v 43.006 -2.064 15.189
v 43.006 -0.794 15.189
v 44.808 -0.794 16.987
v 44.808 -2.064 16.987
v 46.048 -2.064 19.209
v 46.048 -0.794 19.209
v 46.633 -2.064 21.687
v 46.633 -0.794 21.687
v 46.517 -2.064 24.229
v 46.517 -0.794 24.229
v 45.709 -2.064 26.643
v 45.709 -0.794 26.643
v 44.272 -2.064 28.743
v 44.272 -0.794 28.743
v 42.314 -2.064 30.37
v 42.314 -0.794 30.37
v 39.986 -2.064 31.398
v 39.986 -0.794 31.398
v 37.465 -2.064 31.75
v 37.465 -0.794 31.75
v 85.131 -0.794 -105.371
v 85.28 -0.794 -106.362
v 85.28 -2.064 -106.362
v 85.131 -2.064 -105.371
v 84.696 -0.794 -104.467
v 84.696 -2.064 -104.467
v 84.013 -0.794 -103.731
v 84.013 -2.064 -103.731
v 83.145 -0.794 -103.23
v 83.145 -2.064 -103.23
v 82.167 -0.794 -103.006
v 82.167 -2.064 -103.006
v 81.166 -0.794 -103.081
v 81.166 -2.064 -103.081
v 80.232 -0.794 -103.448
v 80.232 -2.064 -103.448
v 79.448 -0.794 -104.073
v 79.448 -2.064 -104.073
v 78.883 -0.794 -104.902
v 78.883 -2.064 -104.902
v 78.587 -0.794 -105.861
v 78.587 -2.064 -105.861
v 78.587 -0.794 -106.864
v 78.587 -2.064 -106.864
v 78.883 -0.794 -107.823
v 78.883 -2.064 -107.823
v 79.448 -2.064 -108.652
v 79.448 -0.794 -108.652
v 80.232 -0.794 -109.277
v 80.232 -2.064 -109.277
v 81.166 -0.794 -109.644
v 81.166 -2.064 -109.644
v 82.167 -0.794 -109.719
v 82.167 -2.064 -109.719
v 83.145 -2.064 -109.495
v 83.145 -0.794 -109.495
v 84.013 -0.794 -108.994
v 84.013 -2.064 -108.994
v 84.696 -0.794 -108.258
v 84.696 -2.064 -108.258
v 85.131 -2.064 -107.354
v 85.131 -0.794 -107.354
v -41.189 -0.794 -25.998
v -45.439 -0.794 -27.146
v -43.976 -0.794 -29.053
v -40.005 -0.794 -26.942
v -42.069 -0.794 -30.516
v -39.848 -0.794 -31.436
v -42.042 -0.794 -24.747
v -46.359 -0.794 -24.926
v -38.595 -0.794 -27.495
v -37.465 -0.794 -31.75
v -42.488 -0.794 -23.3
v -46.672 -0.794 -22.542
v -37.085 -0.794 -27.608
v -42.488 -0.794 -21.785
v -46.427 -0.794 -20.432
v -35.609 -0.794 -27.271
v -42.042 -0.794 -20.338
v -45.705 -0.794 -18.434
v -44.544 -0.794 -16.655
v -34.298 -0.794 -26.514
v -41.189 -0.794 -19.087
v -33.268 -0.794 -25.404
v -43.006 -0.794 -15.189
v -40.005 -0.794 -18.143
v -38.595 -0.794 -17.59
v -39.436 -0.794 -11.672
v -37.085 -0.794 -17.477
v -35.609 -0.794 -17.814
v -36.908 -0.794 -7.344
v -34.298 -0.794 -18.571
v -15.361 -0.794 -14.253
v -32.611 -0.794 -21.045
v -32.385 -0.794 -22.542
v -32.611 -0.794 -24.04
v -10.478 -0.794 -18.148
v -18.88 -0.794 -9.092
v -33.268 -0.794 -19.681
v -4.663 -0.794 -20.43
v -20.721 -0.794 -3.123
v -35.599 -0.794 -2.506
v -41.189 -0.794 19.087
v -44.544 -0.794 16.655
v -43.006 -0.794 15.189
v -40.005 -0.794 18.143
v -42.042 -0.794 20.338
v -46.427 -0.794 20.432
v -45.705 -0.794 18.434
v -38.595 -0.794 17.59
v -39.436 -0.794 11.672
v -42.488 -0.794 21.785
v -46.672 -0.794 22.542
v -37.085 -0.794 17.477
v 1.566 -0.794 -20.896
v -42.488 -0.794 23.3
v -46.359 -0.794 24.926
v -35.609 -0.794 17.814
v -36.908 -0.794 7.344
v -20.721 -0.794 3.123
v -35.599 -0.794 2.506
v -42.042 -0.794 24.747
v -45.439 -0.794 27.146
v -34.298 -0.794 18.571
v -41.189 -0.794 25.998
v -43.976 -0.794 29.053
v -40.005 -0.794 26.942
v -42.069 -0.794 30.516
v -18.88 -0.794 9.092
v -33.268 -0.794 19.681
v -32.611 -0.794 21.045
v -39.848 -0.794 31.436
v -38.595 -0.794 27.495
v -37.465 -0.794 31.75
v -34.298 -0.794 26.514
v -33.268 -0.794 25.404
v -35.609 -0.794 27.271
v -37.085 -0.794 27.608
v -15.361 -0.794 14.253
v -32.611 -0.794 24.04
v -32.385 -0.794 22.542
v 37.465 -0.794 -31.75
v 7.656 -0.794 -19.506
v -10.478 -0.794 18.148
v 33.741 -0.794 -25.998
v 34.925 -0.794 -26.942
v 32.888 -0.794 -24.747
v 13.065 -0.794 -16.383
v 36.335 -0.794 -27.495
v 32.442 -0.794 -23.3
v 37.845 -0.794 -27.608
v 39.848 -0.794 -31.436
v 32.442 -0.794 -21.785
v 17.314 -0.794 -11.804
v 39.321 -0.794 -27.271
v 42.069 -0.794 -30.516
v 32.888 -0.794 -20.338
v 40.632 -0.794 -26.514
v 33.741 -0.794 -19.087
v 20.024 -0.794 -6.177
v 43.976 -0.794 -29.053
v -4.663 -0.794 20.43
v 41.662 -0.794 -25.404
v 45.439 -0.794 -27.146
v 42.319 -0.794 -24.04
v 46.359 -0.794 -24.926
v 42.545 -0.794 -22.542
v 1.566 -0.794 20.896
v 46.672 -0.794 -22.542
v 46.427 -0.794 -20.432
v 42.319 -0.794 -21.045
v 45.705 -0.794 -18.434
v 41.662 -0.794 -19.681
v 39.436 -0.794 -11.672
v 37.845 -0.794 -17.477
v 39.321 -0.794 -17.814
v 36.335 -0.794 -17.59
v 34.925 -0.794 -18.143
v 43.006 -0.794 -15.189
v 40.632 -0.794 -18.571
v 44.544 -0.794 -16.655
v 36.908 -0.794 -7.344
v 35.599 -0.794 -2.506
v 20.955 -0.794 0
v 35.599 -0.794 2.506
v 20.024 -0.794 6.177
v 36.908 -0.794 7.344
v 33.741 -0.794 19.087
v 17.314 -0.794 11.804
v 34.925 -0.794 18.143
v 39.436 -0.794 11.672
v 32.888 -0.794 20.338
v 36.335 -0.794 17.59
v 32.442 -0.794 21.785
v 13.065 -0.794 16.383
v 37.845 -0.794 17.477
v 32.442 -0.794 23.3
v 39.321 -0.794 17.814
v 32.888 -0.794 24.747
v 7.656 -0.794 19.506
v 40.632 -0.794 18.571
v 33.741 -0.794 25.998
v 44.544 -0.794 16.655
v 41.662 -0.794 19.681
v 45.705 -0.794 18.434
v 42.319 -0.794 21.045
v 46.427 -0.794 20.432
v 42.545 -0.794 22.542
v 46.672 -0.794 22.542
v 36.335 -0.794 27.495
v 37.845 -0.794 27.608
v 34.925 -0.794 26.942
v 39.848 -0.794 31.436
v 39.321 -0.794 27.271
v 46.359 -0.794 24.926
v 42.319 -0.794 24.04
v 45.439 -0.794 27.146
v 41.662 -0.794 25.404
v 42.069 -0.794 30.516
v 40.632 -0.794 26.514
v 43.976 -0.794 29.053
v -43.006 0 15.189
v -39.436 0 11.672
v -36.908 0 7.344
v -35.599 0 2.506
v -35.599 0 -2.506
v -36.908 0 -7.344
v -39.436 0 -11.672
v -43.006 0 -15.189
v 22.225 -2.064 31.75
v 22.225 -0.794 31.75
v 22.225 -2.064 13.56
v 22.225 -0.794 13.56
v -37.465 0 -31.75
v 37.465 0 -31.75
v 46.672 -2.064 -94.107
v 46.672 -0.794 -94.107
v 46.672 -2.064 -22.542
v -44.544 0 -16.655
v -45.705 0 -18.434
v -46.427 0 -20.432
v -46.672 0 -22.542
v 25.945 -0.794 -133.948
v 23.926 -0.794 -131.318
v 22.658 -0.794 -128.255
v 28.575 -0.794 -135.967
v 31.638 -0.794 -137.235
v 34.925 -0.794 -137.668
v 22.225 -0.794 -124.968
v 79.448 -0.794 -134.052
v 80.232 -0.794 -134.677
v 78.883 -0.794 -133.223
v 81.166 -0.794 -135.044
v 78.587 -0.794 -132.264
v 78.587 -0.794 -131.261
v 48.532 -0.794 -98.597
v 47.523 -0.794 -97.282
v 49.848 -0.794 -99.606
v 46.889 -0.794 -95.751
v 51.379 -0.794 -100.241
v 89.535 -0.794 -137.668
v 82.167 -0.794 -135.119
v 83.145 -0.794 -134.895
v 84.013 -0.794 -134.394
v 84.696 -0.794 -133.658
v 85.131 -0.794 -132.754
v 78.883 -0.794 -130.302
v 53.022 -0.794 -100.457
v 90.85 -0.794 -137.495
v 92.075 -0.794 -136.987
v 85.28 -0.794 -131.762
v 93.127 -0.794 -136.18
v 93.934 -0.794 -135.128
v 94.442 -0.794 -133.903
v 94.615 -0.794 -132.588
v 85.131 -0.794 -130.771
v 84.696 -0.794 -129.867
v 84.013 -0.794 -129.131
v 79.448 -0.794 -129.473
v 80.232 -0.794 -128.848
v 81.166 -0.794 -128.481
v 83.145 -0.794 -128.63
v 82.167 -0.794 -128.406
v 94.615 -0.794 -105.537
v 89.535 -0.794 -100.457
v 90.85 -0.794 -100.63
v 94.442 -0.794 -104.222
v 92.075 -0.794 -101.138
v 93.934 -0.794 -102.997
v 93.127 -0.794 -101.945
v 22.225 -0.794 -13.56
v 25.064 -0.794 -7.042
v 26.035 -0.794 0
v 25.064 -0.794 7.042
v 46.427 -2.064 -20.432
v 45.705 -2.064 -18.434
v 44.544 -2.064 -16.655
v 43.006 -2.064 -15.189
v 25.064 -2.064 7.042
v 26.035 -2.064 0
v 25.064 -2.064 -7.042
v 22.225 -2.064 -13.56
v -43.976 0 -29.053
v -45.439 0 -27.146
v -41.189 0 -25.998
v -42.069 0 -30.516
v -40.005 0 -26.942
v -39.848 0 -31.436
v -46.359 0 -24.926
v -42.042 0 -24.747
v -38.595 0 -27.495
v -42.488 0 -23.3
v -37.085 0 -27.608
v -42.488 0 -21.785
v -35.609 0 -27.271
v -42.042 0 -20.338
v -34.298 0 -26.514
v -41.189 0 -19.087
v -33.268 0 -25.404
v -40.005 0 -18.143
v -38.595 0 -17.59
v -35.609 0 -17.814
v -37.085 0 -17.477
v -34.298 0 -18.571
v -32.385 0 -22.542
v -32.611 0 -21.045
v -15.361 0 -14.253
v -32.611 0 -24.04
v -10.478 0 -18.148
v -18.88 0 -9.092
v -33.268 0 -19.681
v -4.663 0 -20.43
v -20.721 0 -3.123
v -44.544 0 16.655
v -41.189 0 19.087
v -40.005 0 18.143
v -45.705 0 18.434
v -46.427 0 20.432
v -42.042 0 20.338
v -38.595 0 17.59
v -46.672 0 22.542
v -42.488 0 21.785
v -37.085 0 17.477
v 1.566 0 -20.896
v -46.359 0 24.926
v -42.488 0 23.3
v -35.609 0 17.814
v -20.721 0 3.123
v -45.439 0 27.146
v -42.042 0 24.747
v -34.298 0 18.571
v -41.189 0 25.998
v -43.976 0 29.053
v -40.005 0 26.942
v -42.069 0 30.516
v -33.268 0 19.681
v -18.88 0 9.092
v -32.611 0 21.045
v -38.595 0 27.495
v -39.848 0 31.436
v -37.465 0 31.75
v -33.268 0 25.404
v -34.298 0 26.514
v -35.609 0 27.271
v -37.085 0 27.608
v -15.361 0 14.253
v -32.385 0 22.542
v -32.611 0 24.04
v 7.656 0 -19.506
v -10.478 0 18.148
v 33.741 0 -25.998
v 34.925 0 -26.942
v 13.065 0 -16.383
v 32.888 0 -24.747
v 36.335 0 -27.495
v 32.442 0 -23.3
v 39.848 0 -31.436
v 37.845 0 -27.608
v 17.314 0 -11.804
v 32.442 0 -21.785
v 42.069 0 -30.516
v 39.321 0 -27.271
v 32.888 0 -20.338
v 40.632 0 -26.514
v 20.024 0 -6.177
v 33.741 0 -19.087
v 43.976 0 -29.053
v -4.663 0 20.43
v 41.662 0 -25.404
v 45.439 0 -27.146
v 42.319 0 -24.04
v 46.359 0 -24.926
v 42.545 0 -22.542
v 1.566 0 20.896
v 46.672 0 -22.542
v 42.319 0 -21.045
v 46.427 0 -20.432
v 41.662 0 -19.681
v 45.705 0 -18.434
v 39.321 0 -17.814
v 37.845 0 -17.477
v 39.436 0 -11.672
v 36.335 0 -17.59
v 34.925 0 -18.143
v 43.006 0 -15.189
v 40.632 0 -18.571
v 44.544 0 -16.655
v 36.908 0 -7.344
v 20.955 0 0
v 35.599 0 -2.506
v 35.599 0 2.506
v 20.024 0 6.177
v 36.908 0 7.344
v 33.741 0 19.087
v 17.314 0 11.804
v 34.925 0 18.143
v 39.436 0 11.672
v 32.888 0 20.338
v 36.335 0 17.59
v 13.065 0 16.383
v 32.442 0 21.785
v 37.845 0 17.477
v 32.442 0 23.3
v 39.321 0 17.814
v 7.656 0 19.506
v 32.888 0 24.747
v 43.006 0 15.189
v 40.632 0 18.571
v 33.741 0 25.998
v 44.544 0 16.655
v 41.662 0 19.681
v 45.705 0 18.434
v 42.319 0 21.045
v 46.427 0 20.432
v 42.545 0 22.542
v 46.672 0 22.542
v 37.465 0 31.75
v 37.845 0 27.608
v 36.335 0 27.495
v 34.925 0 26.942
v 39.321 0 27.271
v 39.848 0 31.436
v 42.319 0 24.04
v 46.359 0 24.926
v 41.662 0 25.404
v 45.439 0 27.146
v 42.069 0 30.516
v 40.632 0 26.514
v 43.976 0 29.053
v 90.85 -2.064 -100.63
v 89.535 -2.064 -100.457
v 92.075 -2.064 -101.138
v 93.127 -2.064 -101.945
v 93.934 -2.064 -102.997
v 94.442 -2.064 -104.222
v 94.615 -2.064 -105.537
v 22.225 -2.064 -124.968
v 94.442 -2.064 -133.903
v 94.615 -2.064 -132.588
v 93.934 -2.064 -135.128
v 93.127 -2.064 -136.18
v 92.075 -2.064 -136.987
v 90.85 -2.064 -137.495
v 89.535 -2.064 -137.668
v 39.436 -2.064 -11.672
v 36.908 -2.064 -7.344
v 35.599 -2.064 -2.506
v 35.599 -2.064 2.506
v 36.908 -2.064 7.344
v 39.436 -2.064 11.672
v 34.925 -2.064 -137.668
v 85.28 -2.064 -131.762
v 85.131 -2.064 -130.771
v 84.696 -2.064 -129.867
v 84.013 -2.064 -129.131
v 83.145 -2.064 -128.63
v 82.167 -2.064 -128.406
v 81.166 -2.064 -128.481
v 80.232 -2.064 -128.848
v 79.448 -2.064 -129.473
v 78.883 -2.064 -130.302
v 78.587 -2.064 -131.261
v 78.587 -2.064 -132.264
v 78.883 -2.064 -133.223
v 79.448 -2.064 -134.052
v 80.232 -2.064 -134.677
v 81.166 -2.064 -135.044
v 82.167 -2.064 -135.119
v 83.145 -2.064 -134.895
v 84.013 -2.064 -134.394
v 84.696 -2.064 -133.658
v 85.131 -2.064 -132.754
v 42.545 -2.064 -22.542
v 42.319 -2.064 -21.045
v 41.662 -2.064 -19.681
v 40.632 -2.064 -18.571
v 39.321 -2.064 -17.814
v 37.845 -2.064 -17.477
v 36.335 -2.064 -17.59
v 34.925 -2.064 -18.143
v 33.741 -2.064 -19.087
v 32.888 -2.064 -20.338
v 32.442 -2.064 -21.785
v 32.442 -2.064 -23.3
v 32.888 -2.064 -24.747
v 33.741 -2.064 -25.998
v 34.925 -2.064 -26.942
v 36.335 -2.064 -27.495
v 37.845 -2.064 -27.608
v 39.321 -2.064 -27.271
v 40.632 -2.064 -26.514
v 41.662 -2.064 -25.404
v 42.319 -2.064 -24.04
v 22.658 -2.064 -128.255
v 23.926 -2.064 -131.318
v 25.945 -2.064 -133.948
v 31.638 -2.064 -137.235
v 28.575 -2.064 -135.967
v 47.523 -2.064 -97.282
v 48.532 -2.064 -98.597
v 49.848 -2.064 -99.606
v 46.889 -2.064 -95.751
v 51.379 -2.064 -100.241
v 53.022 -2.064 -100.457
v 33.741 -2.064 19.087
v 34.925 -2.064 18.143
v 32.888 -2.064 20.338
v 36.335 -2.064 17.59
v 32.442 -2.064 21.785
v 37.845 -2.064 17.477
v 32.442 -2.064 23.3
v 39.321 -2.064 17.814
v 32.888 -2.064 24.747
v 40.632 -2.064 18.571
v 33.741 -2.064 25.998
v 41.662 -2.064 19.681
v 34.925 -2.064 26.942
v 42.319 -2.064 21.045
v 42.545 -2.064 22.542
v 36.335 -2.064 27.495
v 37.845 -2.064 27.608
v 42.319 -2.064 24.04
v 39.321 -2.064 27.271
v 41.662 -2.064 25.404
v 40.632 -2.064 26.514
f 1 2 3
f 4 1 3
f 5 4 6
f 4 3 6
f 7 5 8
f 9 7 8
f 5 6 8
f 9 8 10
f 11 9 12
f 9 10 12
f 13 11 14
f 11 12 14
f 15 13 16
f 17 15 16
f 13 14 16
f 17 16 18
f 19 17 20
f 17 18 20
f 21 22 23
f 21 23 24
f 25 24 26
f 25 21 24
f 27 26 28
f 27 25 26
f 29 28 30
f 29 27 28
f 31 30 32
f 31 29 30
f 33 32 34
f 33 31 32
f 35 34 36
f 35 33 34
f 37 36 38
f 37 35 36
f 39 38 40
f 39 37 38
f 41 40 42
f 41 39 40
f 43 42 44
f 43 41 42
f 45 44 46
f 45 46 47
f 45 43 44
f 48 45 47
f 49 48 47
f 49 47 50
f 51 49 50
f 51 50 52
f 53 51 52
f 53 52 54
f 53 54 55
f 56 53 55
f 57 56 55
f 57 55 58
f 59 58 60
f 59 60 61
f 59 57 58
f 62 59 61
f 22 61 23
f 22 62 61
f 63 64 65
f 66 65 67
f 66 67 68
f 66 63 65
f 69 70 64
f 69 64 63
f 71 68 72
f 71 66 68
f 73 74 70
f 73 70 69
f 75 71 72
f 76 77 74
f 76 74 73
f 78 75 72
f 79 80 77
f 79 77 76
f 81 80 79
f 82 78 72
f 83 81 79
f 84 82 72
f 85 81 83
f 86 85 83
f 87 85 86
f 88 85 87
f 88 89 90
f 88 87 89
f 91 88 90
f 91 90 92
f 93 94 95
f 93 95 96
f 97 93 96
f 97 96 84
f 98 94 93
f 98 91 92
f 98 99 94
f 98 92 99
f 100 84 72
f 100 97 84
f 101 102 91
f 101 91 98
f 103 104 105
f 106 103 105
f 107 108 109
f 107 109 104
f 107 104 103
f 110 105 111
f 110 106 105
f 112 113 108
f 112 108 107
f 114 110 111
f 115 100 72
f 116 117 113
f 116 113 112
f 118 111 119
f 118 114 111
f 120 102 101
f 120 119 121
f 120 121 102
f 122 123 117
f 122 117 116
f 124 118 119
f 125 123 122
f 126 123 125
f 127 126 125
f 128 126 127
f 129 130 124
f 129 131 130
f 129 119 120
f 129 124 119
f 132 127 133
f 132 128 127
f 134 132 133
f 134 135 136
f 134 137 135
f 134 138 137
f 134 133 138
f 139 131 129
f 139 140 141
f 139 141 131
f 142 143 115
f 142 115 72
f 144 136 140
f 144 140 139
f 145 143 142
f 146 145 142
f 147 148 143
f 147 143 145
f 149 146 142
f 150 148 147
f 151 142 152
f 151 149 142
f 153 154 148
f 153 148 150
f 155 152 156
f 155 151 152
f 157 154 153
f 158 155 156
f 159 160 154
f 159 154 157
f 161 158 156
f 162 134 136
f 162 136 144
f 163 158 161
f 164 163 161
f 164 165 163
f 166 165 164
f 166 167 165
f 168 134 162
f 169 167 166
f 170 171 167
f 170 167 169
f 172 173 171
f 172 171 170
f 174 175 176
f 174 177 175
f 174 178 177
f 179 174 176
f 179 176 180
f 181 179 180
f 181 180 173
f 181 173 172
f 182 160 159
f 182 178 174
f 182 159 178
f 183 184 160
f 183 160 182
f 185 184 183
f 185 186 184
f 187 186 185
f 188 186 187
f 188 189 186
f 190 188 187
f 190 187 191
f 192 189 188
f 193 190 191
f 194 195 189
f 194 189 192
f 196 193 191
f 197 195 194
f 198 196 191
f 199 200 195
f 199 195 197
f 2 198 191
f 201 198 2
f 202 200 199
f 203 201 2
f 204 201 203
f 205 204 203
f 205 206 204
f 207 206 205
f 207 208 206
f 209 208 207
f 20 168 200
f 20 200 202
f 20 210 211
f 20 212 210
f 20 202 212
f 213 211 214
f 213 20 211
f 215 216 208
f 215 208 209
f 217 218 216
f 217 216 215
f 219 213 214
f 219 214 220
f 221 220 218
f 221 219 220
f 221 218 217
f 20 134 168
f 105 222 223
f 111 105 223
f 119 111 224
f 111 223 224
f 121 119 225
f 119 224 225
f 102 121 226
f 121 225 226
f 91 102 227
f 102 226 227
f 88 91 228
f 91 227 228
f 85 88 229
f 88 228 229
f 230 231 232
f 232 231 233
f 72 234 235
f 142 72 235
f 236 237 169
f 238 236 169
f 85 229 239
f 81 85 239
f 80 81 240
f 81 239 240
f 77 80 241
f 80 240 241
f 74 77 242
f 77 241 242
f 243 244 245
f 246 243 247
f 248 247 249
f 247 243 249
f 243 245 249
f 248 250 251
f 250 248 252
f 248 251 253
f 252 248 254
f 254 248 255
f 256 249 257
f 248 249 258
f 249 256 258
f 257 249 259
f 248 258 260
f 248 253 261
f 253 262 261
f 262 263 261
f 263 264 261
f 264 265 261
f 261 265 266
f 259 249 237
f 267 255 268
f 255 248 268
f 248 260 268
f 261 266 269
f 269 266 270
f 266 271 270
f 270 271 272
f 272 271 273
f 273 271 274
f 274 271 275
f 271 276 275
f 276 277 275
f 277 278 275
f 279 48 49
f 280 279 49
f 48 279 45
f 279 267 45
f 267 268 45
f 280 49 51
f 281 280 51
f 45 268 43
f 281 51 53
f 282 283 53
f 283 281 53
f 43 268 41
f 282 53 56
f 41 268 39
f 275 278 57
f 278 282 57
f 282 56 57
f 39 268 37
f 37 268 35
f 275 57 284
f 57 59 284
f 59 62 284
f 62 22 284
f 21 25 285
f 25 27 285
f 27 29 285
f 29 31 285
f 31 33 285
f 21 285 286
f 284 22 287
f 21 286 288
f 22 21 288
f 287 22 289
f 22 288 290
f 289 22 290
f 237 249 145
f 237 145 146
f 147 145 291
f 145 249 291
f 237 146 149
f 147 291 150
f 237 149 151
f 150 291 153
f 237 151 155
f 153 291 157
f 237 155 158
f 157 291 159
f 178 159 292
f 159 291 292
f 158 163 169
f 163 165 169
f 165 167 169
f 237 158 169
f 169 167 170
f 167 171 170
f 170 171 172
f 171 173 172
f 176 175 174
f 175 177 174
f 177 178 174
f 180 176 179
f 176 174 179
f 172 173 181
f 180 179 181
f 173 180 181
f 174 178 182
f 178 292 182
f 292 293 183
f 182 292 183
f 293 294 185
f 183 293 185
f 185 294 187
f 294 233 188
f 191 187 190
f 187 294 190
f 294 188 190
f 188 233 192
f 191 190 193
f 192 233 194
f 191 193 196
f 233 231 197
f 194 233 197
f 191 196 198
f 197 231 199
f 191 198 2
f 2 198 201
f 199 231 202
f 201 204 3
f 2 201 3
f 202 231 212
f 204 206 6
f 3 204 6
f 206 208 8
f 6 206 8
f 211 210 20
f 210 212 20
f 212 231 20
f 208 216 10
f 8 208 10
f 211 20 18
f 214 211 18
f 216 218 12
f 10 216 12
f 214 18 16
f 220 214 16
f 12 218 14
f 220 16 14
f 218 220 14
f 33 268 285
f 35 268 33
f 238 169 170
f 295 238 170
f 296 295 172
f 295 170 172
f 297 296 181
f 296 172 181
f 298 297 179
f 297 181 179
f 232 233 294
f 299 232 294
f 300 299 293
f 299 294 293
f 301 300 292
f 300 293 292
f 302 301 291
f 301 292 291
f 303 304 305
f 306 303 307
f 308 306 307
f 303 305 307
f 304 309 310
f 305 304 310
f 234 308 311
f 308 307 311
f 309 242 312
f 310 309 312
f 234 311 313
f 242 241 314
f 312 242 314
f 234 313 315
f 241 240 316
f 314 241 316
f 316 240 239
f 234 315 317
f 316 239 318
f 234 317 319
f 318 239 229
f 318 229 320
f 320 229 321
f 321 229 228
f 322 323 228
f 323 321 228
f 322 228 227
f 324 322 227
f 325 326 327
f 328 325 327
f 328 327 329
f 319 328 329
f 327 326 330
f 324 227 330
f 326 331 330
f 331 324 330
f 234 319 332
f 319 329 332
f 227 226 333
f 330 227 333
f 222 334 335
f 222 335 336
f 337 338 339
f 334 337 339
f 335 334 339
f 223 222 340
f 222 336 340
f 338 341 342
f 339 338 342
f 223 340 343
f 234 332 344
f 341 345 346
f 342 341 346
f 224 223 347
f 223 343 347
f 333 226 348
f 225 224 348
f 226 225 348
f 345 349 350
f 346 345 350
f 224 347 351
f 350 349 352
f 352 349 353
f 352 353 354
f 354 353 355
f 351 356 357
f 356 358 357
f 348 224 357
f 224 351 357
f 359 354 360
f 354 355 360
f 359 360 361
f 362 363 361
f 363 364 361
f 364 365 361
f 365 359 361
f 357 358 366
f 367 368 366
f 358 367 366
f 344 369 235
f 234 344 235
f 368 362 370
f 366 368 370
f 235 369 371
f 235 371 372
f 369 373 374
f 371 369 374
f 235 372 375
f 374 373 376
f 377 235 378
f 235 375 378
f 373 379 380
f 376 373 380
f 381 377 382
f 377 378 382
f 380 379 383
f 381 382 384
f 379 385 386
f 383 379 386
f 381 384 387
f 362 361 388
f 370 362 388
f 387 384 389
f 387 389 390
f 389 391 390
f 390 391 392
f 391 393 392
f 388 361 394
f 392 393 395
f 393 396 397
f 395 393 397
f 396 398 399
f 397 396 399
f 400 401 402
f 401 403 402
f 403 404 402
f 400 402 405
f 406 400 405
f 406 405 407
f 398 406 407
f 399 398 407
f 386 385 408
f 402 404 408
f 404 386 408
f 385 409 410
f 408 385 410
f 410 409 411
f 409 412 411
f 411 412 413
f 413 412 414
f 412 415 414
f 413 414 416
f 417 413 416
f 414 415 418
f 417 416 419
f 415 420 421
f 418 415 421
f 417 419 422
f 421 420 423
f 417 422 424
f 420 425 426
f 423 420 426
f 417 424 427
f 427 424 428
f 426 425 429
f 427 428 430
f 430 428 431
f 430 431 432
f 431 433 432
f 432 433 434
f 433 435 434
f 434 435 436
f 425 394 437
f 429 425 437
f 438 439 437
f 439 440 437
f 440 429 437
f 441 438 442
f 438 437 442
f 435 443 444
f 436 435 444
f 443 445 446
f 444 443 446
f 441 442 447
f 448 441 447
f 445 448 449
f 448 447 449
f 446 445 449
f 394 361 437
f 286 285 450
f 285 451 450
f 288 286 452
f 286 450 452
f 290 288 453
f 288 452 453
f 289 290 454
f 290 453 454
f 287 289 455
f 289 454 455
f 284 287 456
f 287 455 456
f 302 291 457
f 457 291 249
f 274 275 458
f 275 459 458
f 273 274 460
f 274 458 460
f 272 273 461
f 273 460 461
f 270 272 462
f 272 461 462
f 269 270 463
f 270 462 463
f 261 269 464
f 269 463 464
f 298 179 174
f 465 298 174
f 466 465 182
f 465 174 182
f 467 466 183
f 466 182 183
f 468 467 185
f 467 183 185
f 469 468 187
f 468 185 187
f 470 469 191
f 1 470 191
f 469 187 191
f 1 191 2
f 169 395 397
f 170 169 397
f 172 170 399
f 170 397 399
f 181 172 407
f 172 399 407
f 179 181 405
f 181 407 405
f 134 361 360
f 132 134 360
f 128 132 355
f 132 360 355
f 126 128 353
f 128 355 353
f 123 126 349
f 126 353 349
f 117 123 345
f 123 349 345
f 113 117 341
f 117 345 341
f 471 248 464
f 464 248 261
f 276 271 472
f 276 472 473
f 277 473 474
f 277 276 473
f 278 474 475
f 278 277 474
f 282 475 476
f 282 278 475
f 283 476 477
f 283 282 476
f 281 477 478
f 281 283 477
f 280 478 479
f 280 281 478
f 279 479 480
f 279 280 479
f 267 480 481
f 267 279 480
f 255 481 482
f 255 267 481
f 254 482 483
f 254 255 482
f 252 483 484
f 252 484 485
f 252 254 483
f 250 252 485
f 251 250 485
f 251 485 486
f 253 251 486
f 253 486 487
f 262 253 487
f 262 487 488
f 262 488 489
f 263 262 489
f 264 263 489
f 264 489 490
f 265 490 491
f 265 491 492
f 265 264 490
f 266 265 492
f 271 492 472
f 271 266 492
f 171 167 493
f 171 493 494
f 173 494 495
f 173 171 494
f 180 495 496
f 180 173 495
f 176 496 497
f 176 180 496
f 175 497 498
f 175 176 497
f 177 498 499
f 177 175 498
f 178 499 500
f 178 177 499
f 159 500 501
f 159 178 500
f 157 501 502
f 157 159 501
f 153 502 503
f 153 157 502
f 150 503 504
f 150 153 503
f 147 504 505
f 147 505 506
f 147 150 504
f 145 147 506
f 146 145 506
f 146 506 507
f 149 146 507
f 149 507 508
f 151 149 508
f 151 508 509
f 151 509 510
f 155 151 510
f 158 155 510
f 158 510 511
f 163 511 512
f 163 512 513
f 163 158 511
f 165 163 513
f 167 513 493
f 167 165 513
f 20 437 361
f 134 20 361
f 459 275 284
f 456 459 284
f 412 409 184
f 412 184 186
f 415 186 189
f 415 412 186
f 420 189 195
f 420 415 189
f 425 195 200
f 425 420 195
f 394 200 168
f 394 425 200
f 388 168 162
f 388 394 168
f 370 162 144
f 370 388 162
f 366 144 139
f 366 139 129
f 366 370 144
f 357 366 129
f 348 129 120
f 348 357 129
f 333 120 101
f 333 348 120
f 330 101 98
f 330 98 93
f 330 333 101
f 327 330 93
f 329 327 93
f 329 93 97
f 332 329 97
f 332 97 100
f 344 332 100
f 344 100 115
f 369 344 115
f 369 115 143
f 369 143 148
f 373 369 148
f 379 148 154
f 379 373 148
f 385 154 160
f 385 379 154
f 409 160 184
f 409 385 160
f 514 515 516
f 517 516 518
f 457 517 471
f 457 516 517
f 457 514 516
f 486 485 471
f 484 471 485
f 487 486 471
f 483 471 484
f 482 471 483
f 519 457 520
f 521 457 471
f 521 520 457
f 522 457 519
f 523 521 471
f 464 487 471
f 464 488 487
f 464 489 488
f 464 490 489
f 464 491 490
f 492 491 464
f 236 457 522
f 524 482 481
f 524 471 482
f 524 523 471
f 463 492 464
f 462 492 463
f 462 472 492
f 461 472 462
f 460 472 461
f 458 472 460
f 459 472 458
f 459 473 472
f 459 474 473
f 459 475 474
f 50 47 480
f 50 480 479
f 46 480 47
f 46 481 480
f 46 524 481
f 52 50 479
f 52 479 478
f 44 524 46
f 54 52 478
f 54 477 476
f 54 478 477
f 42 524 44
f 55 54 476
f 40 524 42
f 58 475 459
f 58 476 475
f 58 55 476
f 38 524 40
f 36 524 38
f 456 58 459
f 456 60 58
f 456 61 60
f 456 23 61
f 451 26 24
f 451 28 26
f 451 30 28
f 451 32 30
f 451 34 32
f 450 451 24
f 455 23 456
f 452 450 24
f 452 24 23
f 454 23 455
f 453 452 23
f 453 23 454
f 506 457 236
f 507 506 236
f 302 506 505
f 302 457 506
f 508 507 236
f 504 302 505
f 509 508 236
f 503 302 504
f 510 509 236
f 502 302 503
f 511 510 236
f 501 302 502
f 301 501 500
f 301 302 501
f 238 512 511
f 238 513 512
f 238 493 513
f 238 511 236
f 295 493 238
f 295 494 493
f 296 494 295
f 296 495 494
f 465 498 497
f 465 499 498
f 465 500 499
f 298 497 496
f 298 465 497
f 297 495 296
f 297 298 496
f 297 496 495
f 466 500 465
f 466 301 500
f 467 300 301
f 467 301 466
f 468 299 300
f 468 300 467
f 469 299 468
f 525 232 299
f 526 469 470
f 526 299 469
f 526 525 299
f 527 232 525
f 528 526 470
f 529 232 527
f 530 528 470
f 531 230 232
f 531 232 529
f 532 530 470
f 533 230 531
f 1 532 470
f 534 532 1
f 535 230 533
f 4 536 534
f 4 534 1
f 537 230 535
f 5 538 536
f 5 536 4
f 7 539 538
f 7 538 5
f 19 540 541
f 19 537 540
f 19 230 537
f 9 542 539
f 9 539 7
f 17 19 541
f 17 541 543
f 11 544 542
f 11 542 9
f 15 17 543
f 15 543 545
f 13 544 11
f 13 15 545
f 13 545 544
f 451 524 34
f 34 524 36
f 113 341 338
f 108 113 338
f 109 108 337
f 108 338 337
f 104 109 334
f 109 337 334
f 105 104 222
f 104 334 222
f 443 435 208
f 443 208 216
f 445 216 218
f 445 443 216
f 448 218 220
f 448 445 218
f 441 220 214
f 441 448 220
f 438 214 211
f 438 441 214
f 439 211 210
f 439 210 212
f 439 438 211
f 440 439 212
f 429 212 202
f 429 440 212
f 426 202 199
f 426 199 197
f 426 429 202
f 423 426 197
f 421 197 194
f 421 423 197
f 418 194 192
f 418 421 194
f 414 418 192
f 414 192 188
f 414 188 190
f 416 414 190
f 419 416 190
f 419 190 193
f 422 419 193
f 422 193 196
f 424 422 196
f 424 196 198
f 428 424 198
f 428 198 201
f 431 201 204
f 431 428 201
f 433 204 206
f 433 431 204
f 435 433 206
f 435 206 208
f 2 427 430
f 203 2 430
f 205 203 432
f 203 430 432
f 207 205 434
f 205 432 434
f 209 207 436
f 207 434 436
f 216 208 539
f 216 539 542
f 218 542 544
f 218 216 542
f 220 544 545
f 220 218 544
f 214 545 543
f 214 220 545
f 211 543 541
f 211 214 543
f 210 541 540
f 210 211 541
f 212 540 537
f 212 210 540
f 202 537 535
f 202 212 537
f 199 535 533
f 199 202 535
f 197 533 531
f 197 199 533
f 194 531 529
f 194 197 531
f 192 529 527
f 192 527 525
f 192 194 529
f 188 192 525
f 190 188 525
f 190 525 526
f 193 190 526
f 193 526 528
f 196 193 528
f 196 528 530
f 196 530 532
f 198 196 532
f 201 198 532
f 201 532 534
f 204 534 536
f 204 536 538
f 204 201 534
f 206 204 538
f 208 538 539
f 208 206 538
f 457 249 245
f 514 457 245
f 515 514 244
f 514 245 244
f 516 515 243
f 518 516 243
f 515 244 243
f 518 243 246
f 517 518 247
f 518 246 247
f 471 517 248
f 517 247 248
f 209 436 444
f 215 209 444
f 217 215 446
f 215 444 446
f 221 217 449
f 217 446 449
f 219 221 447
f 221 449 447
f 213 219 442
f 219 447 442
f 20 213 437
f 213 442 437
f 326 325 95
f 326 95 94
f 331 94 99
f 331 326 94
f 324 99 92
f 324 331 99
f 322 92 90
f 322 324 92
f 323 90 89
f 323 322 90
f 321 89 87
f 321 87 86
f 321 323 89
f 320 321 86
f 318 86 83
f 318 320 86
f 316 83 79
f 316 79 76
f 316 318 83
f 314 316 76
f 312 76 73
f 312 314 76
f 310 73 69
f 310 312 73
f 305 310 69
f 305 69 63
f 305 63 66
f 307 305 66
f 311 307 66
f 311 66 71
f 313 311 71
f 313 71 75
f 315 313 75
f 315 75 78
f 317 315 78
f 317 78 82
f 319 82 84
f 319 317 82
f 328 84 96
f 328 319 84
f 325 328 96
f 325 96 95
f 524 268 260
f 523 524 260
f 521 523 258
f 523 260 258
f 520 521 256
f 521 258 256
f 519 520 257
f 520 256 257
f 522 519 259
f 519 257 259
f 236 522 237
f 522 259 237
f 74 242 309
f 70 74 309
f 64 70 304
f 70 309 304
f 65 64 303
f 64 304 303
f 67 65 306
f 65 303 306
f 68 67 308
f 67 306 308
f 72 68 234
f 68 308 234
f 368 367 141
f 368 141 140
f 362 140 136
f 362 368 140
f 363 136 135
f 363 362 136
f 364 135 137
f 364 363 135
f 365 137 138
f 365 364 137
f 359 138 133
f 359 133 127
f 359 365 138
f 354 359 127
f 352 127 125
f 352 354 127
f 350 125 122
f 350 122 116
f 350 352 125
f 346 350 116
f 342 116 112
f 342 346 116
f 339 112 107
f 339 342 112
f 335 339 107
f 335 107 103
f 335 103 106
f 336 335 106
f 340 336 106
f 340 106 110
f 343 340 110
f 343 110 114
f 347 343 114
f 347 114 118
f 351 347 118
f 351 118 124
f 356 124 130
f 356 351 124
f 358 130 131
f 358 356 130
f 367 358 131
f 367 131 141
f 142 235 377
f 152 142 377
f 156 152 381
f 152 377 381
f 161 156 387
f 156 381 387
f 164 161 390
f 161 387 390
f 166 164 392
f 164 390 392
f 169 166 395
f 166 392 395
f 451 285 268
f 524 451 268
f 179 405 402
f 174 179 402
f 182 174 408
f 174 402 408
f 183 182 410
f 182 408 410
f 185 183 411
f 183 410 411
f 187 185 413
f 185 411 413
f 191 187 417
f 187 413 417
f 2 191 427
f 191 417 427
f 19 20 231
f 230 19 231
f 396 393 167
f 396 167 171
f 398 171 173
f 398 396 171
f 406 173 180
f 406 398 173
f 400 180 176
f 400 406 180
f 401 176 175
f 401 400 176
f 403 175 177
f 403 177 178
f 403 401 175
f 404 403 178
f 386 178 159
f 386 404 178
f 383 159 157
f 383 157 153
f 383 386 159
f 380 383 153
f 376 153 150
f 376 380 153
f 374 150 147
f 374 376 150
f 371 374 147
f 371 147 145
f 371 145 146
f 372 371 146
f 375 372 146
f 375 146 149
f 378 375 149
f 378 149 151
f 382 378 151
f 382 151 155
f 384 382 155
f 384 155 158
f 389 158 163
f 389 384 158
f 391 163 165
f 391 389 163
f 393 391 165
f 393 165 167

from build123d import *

# Parameters (mm, degrees)
F0_R     = 5.08
F0_R_2   = 20.955
F1_DEPTH = 0.79375
F2_R     = 3.3655
F2_R_2   = 5.08
F3_DEPTH = 1.27
F4_R     = 5.08


with BuildPart() as f1:
    # F0 (on Front) → F1 (new body)
    with BuildSketch(Plane.XZ):
        with BuildLine():
            Line((37.465, 31.75), (-37.465, 31.75))
            ThreePointArc((-37.465, 31.75), (-43.975686, 29.053186), (-46.6725, 22.5425))
            ThreePointArc((-46.6725, 22.5425), (-45.705075, 18.434068), (-43.006095, 15.188975))
            ThreePointArc((-43.006095, 15.188975), (-35.433, 0), (-43.006095, -15.188975))
            ThreePointArc((-43.006095, -15.188975), (-45.705075, -18.434068), (-46.6725, -22.5425))
            ThreePointArc((-46.6725, -22.5425), (-43.975686, -29.053186), (-37.465, -31.75))
            Line((-37.465, -31.75), (37.465, -31.75))
            ThreePointArc((37.465, -31.75), (43.975686, -29.053186), (46.6725, -22.5425))
            ThreePointArc((46.6725, -22.5425), (45.705075, -18.434068), (43.006095, -15.188975))
            ThreePointArc((43.006095, -15.188975), (35.433, 0), (43.006095, 15.188975))
            ThreePointArc((43.006095, 15.188975), (45.705075, 18.434068), (46.6725, 22.5425))
            ThreePointArc((46.6725, 22.5425), (43.975686, 29.053186), (37.465, 31.75))
        make_face()
        with Locations((-37.465, -22.5425)):
            Circle(F0_R, mode=Mode.SUBTRACT)
        with Locations((37.465, -22.5425)):
            Circle(F0_R, mode=Mode.SUBTRACT)
        Circle(F0_R_2, mode=Mode.SUBTRACT)
        with Locations((-37.465, 22.5425)):
            Circle(F0_R, mode=Mode.SUBTRACT)
        with Locations((37.465, 22.5425)):
            Circle(F0_R, mode=Mode.SUBTRACT)
    extrude(amount=F1_DEPTH)


with BuildPart() as f3:
    # F2 (on face) → F3 (new body)
    with BuildSketch(Plane.XZ.offset(0.79375)):
        with BuildLine():
            ThreePointArc((43.006095, -15.188975), (35.433, 0), (43.006095, 15.188975))
            ThreePointArc((43.006095, 15.188975), (46.196713, 25.464013), (37.465, 31.75))
            Line((37.465, 31.75), (22.225, 31.75))
            Line((22.225, 31.75), (22.225, 13.559889))
            ThreePointArc((22.225, 13.559889), (26.035, 0), (22.225, -13.559889))
            Line((22.225, -13.559889), (22.225, -124.968))
            ThreePointArc((22.225, -124.968), (25.944744, -133.948256), (34.925, -137.668))
            Line((34.925, -137.668), (94.615, -137.668))
            Line((94.615, -137.668), (94.615, -100.457))
            Line((94.615, -100.457), (53.0225, -100.457))
            ThreePointArc((53.0225, -100.457), (48.532372, -98.597128), (46.6725, -94.107))
            Line((46.6725, -94.107), (46.6725, -22.5425))
            ThreePointArc((46.6725, -22.5425), (45.705075, -18.434068), (43.006095, -15.188975))
        make_face()
        with Locations((81.915, -131.7625)):
            Circle(F2_R, mode=Mode.SUBTRACT)
        with Locations((81.915, -106.3625)):
            Circle(F2_R, mode=Mode.SUBTRACT)
        with Locations((37.465, -22.5425)):
            Circle(F2_R_2, mode=Mode.SUBTRACT)
        with Locations((37.465, 22.5425)):
            Circle(F2_R_2, mode=Mode.SUBTRACT)
    extrude(amount=F3_DEPTH)

    # F4
    f4_edges = [f3.edges().sort_by_distance(p)[0] for p in [
        (94.615, -1.42875, -100.457),
        (94.615, -1.42875, -137.668),
    ]]
    fillet(f4_edges, radius=F4_R)


solid = Compound([f1.part, f3.part])
